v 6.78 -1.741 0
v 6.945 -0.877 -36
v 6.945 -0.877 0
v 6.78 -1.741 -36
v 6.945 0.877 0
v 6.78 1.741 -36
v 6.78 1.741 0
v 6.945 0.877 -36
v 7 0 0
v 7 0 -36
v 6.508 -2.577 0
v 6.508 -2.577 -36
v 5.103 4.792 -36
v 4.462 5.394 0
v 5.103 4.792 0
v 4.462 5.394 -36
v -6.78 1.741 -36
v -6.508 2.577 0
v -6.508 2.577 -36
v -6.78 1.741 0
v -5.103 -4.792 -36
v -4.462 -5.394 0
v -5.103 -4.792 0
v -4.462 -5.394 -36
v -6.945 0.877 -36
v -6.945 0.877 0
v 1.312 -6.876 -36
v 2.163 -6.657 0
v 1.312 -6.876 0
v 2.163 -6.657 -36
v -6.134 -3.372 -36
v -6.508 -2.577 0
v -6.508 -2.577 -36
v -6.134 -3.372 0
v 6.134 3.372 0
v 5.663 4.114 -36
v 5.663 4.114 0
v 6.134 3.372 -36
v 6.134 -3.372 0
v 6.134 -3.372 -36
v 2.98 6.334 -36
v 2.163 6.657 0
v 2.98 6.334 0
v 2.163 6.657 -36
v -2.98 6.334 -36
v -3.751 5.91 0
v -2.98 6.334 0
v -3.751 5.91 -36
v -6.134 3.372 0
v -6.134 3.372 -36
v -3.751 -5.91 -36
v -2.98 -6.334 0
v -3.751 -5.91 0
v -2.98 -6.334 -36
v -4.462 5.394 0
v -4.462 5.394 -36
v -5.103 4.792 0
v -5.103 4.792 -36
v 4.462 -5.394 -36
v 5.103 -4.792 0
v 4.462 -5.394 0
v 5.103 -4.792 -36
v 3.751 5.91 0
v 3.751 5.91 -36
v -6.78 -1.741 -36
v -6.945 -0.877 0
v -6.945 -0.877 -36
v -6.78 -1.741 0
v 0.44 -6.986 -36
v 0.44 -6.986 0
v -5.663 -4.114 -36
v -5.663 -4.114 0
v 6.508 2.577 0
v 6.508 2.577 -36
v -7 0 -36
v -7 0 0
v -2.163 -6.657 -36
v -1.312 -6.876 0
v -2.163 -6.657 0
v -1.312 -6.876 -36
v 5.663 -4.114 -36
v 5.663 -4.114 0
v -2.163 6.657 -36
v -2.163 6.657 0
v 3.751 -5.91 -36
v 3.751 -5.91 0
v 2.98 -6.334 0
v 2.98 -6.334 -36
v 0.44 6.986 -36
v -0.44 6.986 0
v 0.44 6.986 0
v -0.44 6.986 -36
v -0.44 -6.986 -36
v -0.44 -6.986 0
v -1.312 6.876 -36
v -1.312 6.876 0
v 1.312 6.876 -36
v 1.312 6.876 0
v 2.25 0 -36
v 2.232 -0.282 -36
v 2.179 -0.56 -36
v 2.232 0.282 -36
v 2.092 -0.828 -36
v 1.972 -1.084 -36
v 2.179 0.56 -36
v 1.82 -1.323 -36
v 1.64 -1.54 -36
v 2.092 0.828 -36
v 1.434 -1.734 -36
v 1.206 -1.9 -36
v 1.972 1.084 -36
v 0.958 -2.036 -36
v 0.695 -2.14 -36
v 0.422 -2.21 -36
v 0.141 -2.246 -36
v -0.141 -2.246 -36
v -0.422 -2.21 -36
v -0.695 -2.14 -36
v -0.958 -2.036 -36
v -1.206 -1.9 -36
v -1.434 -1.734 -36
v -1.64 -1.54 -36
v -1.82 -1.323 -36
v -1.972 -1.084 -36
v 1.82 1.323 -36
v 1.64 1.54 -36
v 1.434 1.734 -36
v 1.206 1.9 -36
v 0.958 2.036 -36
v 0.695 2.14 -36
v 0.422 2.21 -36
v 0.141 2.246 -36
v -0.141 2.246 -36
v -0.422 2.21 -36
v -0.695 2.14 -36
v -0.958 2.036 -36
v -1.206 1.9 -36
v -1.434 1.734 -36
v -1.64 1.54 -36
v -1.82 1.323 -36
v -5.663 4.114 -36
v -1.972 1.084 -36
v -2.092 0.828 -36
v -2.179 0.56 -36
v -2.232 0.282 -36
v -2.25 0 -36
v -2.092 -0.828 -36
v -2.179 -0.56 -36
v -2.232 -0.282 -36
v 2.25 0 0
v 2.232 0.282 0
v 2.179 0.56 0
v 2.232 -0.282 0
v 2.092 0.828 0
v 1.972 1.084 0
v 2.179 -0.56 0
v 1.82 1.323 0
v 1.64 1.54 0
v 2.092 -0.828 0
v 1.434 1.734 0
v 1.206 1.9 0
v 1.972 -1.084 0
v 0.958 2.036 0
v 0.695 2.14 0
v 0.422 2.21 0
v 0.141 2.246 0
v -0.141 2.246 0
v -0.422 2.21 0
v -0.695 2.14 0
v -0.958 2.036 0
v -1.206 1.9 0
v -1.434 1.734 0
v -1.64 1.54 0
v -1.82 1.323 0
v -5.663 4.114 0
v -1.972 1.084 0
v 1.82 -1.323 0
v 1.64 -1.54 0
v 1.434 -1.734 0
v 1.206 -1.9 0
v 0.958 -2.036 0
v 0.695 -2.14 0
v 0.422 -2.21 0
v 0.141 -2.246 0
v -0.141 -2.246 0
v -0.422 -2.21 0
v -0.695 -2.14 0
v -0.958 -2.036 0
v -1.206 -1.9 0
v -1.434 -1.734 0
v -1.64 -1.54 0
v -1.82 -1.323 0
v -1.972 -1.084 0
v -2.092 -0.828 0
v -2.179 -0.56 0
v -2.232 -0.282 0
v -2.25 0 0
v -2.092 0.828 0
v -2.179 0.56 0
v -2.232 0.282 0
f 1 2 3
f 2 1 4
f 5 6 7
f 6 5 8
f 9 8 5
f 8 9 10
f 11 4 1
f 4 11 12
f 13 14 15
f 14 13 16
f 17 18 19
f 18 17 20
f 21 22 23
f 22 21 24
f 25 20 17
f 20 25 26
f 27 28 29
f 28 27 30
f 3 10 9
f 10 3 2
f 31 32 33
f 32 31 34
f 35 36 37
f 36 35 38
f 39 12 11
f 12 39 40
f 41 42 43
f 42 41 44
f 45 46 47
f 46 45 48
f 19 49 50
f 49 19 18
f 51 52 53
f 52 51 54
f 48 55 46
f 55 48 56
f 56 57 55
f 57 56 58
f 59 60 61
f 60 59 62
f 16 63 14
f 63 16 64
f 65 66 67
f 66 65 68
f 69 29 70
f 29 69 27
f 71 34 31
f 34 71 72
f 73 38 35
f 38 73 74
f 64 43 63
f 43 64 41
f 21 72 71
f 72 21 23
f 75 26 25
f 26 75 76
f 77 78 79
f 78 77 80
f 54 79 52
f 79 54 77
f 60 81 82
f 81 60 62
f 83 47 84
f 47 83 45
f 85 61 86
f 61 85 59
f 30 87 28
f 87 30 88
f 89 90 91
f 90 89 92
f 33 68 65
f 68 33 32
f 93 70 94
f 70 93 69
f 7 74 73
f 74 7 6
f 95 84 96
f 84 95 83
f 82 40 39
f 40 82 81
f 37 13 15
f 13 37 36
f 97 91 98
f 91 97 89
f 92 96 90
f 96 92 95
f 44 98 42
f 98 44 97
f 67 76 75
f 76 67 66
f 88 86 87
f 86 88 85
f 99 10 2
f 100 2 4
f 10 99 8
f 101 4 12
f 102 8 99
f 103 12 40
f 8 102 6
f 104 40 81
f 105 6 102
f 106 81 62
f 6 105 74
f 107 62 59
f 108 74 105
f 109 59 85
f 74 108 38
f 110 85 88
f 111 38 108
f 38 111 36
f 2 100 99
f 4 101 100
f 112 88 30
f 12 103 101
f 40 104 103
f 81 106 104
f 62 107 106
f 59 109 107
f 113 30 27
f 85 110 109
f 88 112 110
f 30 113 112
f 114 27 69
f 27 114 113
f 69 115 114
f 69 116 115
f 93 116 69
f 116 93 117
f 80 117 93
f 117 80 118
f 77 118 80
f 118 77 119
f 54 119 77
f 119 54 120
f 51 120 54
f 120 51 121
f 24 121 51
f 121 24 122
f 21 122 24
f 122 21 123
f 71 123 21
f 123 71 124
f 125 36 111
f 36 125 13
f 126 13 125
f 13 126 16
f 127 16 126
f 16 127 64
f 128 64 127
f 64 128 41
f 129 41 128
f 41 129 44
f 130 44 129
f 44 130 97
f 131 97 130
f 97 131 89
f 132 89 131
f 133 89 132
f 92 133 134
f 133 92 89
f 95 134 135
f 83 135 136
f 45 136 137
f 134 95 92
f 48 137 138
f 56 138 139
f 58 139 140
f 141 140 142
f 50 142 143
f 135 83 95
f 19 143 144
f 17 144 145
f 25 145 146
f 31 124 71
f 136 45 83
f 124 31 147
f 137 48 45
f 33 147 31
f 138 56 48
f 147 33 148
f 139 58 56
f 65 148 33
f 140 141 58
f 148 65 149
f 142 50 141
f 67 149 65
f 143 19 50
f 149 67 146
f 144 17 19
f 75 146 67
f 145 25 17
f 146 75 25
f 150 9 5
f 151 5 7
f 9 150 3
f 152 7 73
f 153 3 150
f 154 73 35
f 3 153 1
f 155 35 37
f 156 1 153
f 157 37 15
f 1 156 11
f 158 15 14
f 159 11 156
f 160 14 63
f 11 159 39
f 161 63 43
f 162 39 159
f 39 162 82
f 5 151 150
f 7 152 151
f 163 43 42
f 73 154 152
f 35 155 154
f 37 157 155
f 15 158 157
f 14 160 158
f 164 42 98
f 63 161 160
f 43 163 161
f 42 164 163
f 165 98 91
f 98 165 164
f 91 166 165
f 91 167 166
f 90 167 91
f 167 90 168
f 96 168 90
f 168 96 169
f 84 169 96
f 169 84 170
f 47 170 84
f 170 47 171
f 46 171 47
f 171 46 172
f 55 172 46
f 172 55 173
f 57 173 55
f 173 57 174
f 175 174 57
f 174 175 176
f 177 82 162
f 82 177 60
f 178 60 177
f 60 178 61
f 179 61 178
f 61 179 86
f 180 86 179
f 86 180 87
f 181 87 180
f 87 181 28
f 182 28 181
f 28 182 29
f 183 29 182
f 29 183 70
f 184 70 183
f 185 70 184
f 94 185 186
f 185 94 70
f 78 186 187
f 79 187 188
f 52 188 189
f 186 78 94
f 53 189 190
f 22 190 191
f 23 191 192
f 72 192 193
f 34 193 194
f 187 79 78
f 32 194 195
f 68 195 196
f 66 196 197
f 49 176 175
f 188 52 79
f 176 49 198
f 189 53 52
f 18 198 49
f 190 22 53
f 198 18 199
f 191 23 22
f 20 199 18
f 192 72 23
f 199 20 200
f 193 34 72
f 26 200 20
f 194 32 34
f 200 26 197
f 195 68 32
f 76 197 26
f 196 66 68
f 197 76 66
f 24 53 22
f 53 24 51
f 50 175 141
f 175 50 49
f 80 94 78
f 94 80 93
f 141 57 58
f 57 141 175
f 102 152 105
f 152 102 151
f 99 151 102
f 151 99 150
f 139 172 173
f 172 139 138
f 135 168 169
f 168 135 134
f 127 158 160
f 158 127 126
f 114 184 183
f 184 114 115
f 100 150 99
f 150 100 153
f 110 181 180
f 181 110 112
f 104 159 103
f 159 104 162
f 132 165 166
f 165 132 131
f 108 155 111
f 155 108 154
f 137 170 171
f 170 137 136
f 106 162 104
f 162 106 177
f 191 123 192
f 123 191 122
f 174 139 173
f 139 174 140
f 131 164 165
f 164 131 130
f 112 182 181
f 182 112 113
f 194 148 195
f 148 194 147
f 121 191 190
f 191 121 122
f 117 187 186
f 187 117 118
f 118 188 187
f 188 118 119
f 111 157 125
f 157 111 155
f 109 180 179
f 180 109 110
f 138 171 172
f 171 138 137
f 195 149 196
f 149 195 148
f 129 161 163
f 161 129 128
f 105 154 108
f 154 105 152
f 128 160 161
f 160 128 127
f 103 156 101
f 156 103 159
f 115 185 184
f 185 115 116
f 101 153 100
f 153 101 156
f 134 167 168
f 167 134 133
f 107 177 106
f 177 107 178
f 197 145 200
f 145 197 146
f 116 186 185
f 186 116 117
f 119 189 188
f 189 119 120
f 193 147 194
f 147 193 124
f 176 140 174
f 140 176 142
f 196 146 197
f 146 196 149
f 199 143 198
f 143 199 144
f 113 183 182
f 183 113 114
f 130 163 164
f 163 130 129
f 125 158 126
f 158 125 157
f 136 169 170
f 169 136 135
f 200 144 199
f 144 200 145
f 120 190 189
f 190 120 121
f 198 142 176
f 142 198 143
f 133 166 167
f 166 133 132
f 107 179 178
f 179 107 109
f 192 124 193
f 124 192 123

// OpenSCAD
$fn = 50;


difference() {
	union() {
		translate(v = [0, 0, -36.0000000000]) {
			cylinder(h = 36, r = 7.0000000000);
		}
		cylinder(h = 0, r = 16.0000000000);
	}
	union() {
		#translate(v = [0, 0, -36]) {
			cylinder(h = 36, r = 2.2500000000);
		}
	}
}
